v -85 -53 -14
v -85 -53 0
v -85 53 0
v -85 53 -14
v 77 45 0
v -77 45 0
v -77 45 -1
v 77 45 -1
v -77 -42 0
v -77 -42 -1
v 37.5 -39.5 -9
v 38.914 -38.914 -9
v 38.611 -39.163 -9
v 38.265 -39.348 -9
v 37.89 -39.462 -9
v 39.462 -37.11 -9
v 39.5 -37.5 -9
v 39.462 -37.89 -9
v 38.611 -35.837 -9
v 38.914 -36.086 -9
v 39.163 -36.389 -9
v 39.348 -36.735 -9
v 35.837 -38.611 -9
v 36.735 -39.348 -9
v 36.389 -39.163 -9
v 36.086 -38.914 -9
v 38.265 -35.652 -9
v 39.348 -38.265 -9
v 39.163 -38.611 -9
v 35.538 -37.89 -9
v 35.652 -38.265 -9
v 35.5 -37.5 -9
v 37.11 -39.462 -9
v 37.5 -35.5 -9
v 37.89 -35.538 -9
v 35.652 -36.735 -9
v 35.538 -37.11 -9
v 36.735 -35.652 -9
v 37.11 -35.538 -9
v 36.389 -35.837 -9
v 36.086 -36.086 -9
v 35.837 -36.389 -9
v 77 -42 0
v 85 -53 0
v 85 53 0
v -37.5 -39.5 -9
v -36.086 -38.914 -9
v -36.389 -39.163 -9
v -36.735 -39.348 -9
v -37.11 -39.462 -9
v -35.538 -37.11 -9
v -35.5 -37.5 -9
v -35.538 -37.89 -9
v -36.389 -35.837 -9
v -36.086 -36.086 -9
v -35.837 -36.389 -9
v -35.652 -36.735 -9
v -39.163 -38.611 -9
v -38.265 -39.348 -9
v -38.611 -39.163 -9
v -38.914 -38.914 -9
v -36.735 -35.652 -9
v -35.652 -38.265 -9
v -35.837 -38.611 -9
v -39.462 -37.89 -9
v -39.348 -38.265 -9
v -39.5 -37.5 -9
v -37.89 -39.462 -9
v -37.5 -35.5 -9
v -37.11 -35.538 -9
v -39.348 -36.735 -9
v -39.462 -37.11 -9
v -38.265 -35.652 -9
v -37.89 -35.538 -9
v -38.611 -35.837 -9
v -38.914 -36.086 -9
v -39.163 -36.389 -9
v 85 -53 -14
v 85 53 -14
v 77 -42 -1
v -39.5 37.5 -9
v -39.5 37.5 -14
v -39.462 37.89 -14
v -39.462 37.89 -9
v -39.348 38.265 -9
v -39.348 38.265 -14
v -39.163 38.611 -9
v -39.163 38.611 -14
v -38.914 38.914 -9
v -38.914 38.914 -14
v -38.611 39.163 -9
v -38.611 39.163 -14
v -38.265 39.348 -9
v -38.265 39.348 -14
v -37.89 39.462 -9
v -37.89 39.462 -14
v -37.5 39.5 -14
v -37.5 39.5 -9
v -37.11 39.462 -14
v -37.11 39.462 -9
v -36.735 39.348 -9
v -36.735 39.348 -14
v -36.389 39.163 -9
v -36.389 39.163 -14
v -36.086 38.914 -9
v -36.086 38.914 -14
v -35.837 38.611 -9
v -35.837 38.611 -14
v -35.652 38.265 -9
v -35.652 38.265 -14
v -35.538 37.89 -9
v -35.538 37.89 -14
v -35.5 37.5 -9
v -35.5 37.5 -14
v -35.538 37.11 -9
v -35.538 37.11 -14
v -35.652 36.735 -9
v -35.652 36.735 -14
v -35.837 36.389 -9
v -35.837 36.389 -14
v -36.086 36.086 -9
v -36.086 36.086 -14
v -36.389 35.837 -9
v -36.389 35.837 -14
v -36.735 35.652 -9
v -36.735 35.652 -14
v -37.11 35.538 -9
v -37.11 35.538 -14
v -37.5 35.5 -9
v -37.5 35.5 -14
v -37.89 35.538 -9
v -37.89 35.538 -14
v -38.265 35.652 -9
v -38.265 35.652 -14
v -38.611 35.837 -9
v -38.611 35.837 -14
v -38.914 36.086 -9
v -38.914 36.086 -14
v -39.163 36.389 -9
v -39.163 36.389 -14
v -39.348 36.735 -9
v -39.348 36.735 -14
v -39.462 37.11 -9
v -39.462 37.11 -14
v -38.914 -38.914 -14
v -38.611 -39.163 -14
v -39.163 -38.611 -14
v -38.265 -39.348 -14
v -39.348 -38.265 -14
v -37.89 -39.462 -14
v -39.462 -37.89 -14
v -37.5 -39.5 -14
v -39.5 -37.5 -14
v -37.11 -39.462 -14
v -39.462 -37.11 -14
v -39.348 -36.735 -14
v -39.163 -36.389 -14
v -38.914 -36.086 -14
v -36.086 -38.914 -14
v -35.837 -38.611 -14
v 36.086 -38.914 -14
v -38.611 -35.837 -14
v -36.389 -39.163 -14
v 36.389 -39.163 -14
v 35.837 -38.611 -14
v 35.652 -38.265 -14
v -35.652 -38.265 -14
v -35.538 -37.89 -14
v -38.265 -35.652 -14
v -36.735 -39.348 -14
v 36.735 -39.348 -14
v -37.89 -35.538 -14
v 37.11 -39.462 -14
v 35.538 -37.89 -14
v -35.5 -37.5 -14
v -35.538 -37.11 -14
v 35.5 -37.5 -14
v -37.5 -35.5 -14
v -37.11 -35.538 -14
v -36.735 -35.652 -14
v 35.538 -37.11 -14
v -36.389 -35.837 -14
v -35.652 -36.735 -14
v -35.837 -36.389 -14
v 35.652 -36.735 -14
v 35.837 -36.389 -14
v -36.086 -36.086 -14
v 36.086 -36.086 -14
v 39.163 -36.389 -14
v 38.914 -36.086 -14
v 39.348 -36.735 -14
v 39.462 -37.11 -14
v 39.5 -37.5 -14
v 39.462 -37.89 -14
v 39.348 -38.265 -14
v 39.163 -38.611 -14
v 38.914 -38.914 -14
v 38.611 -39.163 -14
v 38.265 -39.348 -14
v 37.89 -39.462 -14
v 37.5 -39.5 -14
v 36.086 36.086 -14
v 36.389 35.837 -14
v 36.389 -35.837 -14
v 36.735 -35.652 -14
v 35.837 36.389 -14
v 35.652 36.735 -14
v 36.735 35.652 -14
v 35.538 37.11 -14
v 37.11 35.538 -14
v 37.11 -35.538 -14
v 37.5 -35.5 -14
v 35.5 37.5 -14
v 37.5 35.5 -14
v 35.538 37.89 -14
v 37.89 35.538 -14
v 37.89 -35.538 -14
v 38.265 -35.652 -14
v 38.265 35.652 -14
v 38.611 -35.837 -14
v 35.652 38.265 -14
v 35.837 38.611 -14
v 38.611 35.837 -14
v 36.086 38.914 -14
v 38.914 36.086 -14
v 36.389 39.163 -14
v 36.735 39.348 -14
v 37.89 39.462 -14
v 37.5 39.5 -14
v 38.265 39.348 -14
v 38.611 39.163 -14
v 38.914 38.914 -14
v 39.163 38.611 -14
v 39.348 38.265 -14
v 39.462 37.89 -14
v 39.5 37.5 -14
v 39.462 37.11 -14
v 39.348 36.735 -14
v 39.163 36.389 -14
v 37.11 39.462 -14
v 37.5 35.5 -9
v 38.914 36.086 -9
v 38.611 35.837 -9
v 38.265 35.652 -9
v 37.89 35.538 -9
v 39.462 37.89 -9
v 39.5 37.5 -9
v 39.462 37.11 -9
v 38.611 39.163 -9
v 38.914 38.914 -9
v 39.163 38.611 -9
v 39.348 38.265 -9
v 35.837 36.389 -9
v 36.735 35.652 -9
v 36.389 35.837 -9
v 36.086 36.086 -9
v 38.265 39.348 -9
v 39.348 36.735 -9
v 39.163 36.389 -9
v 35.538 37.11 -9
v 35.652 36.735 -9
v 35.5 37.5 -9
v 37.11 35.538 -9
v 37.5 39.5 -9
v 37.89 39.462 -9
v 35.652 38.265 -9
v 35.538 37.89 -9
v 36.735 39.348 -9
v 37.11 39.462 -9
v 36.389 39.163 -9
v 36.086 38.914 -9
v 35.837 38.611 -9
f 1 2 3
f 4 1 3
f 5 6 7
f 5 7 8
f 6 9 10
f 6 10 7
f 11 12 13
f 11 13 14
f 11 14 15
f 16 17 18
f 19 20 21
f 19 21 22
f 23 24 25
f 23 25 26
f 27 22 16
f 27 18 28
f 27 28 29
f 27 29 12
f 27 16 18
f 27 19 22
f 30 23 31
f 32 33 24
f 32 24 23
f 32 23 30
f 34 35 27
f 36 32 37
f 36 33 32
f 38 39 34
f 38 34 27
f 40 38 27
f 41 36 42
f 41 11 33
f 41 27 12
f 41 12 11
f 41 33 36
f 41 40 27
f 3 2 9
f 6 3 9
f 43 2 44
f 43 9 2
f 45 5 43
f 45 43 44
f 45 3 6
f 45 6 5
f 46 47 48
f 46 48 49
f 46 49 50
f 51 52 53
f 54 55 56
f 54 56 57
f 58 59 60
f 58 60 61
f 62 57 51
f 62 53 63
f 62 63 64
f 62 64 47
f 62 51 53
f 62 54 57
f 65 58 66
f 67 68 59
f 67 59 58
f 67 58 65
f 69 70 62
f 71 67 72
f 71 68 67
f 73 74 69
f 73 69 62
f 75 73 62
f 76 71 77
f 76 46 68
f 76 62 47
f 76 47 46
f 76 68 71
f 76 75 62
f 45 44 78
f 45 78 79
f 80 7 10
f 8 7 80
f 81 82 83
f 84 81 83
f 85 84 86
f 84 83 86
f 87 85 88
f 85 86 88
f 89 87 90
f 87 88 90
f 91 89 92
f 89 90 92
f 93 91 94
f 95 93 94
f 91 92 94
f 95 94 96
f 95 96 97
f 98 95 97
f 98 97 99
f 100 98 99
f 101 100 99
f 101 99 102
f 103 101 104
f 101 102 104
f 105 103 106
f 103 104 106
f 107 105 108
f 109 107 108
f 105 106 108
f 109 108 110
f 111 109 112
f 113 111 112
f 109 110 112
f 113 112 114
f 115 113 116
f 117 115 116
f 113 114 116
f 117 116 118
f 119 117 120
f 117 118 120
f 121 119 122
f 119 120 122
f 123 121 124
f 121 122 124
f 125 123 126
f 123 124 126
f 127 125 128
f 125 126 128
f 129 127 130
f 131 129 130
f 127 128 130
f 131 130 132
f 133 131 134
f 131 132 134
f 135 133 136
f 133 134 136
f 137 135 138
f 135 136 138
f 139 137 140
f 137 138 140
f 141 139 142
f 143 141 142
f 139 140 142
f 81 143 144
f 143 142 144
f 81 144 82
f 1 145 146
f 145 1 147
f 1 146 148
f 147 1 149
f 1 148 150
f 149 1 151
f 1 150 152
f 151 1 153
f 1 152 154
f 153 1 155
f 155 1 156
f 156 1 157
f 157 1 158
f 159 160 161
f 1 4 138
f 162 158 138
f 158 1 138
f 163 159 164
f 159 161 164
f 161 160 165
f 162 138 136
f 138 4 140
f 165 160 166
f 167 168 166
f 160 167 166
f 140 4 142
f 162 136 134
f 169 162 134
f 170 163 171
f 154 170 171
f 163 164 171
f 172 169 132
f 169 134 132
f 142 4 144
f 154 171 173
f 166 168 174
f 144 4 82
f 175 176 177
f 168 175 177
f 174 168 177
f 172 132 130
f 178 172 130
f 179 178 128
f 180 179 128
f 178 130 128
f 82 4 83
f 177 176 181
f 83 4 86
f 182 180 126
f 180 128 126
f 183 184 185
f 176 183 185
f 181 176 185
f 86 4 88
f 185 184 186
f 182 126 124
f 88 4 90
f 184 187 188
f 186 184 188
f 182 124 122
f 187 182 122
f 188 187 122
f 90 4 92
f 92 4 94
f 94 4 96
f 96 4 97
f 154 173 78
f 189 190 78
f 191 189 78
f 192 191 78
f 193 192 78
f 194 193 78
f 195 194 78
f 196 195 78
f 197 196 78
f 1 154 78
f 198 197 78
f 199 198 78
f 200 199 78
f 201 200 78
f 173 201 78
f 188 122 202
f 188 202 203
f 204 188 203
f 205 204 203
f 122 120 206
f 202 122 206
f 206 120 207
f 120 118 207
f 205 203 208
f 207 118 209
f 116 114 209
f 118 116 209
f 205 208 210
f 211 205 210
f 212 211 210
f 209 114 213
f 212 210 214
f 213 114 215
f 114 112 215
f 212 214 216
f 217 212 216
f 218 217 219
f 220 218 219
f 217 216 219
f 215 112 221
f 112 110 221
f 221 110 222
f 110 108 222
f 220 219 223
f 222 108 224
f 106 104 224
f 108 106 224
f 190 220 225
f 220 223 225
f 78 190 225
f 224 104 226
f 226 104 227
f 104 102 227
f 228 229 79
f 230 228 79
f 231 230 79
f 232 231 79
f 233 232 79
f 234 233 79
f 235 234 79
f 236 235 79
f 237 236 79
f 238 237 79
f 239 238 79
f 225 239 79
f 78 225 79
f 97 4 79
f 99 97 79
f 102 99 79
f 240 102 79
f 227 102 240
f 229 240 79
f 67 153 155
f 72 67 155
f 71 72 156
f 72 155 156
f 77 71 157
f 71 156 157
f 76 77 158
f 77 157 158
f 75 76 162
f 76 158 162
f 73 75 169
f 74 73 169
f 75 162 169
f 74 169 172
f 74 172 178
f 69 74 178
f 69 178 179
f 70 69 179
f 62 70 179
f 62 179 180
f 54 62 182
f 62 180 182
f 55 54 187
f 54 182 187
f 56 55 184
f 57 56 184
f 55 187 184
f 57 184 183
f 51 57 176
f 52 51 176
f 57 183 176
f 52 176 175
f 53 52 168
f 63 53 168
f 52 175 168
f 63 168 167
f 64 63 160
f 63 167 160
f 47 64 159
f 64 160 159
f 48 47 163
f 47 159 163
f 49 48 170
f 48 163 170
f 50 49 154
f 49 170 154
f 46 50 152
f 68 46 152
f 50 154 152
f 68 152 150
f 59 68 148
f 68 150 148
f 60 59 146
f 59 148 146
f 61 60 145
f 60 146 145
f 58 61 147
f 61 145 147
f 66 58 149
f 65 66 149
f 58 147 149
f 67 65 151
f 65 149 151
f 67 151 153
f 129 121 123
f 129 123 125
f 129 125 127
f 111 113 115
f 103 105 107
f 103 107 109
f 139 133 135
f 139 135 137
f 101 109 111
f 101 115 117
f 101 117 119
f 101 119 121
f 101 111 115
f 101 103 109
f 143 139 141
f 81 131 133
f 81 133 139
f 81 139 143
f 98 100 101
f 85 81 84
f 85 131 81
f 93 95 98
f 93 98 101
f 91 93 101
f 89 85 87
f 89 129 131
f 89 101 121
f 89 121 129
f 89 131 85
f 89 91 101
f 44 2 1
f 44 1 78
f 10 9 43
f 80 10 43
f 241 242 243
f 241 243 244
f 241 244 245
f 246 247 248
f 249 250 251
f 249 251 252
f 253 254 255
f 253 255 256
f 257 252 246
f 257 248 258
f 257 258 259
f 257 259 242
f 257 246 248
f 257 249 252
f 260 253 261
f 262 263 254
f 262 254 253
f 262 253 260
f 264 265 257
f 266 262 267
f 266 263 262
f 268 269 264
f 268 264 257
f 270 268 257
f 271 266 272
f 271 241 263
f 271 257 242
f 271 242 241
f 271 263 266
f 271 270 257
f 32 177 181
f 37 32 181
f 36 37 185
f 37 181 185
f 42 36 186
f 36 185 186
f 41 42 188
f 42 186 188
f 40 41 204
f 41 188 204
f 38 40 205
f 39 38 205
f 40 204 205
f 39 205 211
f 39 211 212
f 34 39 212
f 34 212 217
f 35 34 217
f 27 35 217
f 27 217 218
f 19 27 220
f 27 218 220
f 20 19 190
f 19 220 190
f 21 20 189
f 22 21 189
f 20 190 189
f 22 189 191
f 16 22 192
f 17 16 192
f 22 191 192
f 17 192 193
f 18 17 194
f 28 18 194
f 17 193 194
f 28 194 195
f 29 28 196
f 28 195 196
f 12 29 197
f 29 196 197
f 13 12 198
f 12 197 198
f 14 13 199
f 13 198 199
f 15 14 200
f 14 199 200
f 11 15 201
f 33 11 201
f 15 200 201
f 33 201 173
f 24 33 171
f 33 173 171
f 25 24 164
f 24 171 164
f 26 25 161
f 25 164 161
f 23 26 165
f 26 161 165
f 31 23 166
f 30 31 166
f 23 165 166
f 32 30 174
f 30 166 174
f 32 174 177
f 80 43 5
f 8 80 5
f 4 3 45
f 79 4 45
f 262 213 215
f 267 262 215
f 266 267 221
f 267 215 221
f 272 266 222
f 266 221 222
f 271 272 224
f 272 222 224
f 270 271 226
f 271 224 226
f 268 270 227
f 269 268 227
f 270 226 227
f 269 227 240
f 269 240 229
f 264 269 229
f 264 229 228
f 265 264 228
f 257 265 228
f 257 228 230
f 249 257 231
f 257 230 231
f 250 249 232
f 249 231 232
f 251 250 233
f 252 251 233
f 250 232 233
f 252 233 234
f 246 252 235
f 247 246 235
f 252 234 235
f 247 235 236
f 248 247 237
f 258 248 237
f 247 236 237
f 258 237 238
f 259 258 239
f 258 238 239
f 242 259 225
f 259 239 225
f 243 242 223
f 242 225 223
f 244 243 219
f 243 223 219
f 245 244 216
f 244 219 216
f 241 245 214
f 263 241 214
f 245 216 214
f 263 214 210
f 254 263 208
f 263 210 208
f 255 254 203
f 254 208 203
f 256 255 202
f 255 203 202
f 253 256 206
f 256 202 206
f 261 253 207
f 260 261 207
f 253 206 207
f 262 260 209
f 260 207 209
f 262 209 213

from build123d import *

# Parameters (mm, degrees)
SKETCH_1_W          = 170
SKETCH_1_H          = 106
EXTRUDE_1_DEPTH     = 14
SKETCH_2_R          = 2
CUT_EXTRUDE_1_DEPTH = 5
SKETCH_3_W          = 154
SKETCH_3_H          = 87
CUT_EXTRUDE_2_DEPTH = 1


with BuildPart() as part:
    # 草图1 → 凸台-拉伸1 (new body)
    with BuildSketch(Plane.XY):
        Rectangle(SKETCH_1_W, SKETCH_1_H)
    extrude(amount=-EXTRUDE_1_DEPTH)

    # 草图2 → 切除-拉伸1 (cut)
    with BuildSketch(Plane(origin=(0, 0, -14), x_dir=(-1, 0, 0), z_dir=(0, 0, -1))):
        with Locations((37.5, 37.5)):
            Circle(SKETCH_2_R)
        with Locations((-37.5, 37.5)):
            Circle(SKETCH_2_R)
        with Locations((-37.5, -37.5)):
            Circle(SKETCH_2_R)
        with Locations((37.5, -37.5)):
            Circle(SKETCH_2_R)
    extrude(amount=-CUT_EXTRUDE_1_DEPTH, mode=Mode.SUBTRACT)

    # 草图3 → 切除-拉伸2 (cut)
    with BuildSketch(Plane.XY):
        with Locations((0, 1.5)):
            Rectangle(SKETCH_3_W, SKETCH_3_H)
    extrude(amount=-CUT_EXTRUDE_2_DEPTH, mode=Mode.SUBTRACT)


solid = part.part
